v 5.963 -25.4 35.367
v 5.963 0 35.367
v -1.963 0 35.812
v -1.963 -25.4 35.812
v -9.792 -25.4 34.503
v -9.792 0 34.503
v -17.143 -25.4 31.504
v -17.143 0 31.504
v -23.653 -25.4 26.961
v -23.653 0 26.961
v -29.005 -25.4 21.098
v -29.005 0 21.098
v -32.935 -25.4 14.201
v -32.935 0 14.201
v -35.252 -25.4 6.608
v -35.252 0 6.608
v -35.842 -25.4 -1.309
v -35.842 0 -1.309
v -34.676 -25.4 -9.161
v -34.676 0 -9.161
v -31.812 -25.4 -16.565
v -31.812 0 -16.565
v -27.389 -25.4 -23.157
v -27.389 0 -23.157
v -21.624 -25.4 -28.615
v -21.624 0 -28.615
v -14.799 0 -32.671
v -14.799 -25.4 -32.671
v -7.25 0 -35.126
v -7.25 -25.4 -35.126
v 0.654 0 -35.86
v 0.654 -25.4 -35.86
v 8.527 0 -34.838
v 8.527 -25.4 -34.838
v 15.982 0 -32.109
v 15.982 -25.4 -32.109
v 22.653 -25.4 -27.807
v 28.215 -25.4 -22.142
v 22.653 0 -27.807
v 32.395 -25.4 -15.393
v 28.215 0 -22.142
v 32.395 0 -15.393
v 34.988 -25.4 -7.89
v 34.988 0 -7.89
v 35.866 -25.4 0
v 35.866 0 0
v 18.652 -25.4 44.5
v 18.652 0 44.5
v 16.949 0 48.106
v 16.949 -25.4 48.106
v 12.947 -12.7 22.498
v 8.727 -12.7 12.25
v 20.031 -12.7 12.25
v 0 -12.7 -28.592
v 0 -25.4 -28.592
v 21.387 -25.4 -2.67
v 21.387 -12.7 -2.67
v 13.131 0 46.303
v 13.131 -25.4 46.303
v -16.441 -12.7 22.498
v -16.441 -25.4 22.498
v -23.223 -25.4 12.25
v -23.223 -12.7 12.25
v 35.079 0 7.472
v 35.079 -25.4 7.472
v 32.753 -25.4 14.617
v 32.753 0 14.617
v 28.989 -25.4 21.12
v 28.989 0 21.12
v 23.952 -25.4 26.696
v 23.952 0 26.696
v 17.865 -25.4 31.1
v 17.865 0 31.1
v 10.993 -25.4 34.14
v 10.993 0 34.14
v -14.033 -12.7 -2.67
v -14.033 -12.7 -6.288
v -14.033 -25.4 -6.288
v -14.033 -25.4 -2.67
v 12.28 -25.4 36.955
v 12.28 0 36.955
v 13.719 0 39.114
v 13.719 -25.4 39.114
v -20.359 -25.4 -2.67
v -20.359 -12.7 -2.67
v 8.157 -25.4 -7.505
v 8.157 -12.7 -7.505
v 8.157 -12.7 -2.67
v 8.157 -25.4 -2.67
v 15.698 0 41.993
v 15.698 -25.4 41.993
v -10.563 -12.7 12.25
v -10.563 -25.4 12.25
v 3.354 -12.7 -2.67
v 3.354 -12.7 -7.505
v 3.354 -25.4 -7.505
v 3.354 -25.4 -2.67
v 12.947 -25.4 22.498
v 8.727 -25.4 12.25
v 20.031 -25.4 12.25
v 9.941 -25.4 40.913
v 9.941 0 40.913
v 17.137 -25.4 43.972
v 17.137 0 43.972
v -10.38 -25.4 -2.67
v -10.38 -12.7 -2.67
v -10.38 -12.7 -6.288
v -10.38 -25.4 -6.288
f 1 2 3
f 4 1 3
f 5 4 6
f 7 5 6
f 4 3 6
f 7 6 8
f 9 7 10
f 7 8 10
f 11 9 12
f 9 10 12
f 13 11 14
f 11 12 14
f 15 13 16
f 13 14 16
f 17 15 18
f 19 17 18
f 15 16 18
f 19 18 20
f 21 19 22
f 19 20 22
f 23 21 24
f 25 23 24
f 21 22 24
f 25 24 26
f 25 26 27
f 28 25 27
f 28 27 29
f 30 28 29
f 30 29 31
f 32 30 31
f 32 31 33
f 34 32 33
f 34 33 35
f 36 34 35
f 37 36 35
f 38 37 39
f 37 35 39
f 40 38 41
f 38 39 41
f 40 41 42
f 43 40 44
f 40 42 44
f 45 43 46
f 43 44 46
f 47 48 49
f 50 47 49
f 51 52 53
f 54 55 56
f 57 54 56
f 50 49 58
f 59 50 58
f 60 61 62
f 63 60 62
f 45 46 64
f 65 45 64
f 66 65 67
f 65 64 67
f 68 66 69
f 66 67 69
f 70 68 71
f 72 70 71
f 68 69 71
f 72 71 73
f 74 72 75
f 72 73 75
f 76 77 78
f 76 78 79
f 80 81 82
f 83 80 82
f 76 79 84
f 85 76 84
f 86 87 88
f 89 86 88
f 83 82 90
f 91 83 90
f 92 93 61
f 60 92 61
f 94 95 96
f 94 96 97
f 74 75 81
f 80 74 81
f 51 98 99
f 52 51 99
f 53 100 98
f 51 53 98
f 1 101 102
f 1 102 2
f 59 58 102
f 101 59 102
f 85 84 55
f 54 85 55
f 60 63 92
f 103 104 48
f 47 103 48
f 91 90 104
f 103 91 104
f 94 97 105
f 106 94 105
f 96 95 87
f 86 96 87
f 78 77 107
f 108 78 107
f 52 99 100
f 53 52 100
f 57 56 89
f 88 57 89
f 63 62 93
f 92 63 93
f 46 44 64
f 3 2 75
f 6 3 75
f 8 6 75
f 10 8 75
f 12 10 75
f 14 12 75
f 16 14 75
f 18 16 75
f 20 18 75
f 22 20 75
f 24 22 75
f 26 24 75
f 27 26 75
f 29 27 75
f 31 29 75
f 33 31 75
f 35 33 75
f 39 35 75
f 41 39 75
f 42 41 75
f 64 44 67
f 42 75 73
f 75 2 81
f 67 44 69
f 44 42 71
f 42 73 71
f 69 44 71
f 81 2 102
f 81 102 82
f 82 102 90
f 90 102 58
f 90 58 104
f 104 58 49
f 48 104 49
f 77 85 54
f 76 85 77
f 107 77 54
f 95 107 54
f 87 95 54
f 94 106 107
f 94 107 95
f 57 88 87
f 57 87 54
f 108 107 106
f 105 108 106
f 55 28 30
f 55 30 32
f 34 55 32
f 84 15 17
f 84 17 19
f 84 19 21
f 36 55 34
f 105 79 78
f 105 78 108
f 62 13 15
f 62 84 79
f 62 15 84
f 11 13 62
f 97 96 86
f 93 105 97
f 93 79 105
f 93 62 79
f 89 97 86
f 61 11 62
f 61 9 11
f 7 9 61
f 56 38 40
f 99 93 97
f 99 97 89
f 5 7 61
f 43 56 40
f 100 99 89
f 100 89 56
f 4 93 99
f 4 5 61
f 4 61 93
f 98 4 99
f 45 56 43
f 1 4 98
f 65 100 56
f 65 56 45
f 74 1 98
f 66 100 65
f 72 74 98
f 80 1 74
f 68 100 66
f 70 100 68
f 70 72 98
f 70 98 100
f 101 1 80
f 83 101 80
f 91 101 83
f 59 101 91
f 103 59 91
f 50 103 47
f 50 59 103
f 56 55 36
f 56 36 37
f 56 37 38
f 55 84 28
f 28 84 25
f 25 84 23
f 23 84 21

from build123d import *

# Parameters (mm, degrees)
F1_DEPTH = 25.4
F3_DEPTH = 12.7
F5_DEPTH = 12.7
F6_W     = 3.653213
F6_H     = 3.617645
F6_W_2   = 4.803298
F6_H_2   = 4.835383
F7_DEPTH = 12.7


with BuildPart() as f1:
    # F0 (on Front) → F1 (new body)
    with BuildSketch(Plane.XZ):
        with BuildLine():
            ThreePointArc((5.963441, 35.366944), (-27.388586, -23.157045), (35.866187, 0))
            ThreePointArc((35.866187, 0), (28.988599, 21.119765), (10.993484, 34.13981))
            ThreePointArc((10.993484, 34.13981), (8.500635, 34.844261), (5.963441, 35.366944))
        make_face()
        with BuildLine():
            ThreePointArc((5.963441, 35.366944), (8.500635, 34.844261), (10.993484, 34.13981))
            Line((10.993484, 34.13981), (12.279672, 36.955047))
            Line((12.279672, 36.955047), (13.718993, 39.114028))
            Line((13.718993, 39.114028), (15.69806, 41.992676))
            Line((15.69806, 41.992676), (17.137382, 43.97174))
            Line((17.137382, 43.97174), (18.651877, 44.50046))
            Line((18.651877, 44.50046), (16.949486, 48.106024))
            Line((16.949486, 48.106024), (13.131301, 46.303242))
            Line((13.131301, 46.303242), (9.940774, 40.91318))
            Line((9.940774, 40.91318), (5.963441, 35.366944))
        make_face()
    extrude(amount=F1_DEPTH)

    # F2 (on face) → F3 (cut)
    with BuildSketch(Plane.XZ.offset(25.4)):
        Polygon((-10.563217, 12.250198), (-16.440853, 22.498386), (-23.222743, 12.250198), align=None)
        Polygon((20.030638, 12.250198), (12.94733, 22.498386), (8.72749, 12.250198), align=None)
    extrude(amount=-F3_DEPTH, mode=Mode.SUBTRACT)

    # F4 (on face) → F5 (cut)
    with BuildSketch(Plane.XZ.offset(25.4)):
        Polygon((21.387015, -2.669957), (-20.359278, -2.669957), (0, -28.591841), align=None)
    extrude(amount=-F5_DEPTH, mode=Mode.SUBTRACT)

    # F6 (on face) → F7 (join)
    with BuildSketch(Plane.XZ.offset(12.7)):
        with Locations((-12.206394, -4.478779)):
            Rectangle(F6_W, F6_H)
        with Locations((5.755238, -5.087648)):
            Rectangle(F6_W_2, F6_H_2)
    extrude(amount=F7_DEPTH)


solid = f1.part
